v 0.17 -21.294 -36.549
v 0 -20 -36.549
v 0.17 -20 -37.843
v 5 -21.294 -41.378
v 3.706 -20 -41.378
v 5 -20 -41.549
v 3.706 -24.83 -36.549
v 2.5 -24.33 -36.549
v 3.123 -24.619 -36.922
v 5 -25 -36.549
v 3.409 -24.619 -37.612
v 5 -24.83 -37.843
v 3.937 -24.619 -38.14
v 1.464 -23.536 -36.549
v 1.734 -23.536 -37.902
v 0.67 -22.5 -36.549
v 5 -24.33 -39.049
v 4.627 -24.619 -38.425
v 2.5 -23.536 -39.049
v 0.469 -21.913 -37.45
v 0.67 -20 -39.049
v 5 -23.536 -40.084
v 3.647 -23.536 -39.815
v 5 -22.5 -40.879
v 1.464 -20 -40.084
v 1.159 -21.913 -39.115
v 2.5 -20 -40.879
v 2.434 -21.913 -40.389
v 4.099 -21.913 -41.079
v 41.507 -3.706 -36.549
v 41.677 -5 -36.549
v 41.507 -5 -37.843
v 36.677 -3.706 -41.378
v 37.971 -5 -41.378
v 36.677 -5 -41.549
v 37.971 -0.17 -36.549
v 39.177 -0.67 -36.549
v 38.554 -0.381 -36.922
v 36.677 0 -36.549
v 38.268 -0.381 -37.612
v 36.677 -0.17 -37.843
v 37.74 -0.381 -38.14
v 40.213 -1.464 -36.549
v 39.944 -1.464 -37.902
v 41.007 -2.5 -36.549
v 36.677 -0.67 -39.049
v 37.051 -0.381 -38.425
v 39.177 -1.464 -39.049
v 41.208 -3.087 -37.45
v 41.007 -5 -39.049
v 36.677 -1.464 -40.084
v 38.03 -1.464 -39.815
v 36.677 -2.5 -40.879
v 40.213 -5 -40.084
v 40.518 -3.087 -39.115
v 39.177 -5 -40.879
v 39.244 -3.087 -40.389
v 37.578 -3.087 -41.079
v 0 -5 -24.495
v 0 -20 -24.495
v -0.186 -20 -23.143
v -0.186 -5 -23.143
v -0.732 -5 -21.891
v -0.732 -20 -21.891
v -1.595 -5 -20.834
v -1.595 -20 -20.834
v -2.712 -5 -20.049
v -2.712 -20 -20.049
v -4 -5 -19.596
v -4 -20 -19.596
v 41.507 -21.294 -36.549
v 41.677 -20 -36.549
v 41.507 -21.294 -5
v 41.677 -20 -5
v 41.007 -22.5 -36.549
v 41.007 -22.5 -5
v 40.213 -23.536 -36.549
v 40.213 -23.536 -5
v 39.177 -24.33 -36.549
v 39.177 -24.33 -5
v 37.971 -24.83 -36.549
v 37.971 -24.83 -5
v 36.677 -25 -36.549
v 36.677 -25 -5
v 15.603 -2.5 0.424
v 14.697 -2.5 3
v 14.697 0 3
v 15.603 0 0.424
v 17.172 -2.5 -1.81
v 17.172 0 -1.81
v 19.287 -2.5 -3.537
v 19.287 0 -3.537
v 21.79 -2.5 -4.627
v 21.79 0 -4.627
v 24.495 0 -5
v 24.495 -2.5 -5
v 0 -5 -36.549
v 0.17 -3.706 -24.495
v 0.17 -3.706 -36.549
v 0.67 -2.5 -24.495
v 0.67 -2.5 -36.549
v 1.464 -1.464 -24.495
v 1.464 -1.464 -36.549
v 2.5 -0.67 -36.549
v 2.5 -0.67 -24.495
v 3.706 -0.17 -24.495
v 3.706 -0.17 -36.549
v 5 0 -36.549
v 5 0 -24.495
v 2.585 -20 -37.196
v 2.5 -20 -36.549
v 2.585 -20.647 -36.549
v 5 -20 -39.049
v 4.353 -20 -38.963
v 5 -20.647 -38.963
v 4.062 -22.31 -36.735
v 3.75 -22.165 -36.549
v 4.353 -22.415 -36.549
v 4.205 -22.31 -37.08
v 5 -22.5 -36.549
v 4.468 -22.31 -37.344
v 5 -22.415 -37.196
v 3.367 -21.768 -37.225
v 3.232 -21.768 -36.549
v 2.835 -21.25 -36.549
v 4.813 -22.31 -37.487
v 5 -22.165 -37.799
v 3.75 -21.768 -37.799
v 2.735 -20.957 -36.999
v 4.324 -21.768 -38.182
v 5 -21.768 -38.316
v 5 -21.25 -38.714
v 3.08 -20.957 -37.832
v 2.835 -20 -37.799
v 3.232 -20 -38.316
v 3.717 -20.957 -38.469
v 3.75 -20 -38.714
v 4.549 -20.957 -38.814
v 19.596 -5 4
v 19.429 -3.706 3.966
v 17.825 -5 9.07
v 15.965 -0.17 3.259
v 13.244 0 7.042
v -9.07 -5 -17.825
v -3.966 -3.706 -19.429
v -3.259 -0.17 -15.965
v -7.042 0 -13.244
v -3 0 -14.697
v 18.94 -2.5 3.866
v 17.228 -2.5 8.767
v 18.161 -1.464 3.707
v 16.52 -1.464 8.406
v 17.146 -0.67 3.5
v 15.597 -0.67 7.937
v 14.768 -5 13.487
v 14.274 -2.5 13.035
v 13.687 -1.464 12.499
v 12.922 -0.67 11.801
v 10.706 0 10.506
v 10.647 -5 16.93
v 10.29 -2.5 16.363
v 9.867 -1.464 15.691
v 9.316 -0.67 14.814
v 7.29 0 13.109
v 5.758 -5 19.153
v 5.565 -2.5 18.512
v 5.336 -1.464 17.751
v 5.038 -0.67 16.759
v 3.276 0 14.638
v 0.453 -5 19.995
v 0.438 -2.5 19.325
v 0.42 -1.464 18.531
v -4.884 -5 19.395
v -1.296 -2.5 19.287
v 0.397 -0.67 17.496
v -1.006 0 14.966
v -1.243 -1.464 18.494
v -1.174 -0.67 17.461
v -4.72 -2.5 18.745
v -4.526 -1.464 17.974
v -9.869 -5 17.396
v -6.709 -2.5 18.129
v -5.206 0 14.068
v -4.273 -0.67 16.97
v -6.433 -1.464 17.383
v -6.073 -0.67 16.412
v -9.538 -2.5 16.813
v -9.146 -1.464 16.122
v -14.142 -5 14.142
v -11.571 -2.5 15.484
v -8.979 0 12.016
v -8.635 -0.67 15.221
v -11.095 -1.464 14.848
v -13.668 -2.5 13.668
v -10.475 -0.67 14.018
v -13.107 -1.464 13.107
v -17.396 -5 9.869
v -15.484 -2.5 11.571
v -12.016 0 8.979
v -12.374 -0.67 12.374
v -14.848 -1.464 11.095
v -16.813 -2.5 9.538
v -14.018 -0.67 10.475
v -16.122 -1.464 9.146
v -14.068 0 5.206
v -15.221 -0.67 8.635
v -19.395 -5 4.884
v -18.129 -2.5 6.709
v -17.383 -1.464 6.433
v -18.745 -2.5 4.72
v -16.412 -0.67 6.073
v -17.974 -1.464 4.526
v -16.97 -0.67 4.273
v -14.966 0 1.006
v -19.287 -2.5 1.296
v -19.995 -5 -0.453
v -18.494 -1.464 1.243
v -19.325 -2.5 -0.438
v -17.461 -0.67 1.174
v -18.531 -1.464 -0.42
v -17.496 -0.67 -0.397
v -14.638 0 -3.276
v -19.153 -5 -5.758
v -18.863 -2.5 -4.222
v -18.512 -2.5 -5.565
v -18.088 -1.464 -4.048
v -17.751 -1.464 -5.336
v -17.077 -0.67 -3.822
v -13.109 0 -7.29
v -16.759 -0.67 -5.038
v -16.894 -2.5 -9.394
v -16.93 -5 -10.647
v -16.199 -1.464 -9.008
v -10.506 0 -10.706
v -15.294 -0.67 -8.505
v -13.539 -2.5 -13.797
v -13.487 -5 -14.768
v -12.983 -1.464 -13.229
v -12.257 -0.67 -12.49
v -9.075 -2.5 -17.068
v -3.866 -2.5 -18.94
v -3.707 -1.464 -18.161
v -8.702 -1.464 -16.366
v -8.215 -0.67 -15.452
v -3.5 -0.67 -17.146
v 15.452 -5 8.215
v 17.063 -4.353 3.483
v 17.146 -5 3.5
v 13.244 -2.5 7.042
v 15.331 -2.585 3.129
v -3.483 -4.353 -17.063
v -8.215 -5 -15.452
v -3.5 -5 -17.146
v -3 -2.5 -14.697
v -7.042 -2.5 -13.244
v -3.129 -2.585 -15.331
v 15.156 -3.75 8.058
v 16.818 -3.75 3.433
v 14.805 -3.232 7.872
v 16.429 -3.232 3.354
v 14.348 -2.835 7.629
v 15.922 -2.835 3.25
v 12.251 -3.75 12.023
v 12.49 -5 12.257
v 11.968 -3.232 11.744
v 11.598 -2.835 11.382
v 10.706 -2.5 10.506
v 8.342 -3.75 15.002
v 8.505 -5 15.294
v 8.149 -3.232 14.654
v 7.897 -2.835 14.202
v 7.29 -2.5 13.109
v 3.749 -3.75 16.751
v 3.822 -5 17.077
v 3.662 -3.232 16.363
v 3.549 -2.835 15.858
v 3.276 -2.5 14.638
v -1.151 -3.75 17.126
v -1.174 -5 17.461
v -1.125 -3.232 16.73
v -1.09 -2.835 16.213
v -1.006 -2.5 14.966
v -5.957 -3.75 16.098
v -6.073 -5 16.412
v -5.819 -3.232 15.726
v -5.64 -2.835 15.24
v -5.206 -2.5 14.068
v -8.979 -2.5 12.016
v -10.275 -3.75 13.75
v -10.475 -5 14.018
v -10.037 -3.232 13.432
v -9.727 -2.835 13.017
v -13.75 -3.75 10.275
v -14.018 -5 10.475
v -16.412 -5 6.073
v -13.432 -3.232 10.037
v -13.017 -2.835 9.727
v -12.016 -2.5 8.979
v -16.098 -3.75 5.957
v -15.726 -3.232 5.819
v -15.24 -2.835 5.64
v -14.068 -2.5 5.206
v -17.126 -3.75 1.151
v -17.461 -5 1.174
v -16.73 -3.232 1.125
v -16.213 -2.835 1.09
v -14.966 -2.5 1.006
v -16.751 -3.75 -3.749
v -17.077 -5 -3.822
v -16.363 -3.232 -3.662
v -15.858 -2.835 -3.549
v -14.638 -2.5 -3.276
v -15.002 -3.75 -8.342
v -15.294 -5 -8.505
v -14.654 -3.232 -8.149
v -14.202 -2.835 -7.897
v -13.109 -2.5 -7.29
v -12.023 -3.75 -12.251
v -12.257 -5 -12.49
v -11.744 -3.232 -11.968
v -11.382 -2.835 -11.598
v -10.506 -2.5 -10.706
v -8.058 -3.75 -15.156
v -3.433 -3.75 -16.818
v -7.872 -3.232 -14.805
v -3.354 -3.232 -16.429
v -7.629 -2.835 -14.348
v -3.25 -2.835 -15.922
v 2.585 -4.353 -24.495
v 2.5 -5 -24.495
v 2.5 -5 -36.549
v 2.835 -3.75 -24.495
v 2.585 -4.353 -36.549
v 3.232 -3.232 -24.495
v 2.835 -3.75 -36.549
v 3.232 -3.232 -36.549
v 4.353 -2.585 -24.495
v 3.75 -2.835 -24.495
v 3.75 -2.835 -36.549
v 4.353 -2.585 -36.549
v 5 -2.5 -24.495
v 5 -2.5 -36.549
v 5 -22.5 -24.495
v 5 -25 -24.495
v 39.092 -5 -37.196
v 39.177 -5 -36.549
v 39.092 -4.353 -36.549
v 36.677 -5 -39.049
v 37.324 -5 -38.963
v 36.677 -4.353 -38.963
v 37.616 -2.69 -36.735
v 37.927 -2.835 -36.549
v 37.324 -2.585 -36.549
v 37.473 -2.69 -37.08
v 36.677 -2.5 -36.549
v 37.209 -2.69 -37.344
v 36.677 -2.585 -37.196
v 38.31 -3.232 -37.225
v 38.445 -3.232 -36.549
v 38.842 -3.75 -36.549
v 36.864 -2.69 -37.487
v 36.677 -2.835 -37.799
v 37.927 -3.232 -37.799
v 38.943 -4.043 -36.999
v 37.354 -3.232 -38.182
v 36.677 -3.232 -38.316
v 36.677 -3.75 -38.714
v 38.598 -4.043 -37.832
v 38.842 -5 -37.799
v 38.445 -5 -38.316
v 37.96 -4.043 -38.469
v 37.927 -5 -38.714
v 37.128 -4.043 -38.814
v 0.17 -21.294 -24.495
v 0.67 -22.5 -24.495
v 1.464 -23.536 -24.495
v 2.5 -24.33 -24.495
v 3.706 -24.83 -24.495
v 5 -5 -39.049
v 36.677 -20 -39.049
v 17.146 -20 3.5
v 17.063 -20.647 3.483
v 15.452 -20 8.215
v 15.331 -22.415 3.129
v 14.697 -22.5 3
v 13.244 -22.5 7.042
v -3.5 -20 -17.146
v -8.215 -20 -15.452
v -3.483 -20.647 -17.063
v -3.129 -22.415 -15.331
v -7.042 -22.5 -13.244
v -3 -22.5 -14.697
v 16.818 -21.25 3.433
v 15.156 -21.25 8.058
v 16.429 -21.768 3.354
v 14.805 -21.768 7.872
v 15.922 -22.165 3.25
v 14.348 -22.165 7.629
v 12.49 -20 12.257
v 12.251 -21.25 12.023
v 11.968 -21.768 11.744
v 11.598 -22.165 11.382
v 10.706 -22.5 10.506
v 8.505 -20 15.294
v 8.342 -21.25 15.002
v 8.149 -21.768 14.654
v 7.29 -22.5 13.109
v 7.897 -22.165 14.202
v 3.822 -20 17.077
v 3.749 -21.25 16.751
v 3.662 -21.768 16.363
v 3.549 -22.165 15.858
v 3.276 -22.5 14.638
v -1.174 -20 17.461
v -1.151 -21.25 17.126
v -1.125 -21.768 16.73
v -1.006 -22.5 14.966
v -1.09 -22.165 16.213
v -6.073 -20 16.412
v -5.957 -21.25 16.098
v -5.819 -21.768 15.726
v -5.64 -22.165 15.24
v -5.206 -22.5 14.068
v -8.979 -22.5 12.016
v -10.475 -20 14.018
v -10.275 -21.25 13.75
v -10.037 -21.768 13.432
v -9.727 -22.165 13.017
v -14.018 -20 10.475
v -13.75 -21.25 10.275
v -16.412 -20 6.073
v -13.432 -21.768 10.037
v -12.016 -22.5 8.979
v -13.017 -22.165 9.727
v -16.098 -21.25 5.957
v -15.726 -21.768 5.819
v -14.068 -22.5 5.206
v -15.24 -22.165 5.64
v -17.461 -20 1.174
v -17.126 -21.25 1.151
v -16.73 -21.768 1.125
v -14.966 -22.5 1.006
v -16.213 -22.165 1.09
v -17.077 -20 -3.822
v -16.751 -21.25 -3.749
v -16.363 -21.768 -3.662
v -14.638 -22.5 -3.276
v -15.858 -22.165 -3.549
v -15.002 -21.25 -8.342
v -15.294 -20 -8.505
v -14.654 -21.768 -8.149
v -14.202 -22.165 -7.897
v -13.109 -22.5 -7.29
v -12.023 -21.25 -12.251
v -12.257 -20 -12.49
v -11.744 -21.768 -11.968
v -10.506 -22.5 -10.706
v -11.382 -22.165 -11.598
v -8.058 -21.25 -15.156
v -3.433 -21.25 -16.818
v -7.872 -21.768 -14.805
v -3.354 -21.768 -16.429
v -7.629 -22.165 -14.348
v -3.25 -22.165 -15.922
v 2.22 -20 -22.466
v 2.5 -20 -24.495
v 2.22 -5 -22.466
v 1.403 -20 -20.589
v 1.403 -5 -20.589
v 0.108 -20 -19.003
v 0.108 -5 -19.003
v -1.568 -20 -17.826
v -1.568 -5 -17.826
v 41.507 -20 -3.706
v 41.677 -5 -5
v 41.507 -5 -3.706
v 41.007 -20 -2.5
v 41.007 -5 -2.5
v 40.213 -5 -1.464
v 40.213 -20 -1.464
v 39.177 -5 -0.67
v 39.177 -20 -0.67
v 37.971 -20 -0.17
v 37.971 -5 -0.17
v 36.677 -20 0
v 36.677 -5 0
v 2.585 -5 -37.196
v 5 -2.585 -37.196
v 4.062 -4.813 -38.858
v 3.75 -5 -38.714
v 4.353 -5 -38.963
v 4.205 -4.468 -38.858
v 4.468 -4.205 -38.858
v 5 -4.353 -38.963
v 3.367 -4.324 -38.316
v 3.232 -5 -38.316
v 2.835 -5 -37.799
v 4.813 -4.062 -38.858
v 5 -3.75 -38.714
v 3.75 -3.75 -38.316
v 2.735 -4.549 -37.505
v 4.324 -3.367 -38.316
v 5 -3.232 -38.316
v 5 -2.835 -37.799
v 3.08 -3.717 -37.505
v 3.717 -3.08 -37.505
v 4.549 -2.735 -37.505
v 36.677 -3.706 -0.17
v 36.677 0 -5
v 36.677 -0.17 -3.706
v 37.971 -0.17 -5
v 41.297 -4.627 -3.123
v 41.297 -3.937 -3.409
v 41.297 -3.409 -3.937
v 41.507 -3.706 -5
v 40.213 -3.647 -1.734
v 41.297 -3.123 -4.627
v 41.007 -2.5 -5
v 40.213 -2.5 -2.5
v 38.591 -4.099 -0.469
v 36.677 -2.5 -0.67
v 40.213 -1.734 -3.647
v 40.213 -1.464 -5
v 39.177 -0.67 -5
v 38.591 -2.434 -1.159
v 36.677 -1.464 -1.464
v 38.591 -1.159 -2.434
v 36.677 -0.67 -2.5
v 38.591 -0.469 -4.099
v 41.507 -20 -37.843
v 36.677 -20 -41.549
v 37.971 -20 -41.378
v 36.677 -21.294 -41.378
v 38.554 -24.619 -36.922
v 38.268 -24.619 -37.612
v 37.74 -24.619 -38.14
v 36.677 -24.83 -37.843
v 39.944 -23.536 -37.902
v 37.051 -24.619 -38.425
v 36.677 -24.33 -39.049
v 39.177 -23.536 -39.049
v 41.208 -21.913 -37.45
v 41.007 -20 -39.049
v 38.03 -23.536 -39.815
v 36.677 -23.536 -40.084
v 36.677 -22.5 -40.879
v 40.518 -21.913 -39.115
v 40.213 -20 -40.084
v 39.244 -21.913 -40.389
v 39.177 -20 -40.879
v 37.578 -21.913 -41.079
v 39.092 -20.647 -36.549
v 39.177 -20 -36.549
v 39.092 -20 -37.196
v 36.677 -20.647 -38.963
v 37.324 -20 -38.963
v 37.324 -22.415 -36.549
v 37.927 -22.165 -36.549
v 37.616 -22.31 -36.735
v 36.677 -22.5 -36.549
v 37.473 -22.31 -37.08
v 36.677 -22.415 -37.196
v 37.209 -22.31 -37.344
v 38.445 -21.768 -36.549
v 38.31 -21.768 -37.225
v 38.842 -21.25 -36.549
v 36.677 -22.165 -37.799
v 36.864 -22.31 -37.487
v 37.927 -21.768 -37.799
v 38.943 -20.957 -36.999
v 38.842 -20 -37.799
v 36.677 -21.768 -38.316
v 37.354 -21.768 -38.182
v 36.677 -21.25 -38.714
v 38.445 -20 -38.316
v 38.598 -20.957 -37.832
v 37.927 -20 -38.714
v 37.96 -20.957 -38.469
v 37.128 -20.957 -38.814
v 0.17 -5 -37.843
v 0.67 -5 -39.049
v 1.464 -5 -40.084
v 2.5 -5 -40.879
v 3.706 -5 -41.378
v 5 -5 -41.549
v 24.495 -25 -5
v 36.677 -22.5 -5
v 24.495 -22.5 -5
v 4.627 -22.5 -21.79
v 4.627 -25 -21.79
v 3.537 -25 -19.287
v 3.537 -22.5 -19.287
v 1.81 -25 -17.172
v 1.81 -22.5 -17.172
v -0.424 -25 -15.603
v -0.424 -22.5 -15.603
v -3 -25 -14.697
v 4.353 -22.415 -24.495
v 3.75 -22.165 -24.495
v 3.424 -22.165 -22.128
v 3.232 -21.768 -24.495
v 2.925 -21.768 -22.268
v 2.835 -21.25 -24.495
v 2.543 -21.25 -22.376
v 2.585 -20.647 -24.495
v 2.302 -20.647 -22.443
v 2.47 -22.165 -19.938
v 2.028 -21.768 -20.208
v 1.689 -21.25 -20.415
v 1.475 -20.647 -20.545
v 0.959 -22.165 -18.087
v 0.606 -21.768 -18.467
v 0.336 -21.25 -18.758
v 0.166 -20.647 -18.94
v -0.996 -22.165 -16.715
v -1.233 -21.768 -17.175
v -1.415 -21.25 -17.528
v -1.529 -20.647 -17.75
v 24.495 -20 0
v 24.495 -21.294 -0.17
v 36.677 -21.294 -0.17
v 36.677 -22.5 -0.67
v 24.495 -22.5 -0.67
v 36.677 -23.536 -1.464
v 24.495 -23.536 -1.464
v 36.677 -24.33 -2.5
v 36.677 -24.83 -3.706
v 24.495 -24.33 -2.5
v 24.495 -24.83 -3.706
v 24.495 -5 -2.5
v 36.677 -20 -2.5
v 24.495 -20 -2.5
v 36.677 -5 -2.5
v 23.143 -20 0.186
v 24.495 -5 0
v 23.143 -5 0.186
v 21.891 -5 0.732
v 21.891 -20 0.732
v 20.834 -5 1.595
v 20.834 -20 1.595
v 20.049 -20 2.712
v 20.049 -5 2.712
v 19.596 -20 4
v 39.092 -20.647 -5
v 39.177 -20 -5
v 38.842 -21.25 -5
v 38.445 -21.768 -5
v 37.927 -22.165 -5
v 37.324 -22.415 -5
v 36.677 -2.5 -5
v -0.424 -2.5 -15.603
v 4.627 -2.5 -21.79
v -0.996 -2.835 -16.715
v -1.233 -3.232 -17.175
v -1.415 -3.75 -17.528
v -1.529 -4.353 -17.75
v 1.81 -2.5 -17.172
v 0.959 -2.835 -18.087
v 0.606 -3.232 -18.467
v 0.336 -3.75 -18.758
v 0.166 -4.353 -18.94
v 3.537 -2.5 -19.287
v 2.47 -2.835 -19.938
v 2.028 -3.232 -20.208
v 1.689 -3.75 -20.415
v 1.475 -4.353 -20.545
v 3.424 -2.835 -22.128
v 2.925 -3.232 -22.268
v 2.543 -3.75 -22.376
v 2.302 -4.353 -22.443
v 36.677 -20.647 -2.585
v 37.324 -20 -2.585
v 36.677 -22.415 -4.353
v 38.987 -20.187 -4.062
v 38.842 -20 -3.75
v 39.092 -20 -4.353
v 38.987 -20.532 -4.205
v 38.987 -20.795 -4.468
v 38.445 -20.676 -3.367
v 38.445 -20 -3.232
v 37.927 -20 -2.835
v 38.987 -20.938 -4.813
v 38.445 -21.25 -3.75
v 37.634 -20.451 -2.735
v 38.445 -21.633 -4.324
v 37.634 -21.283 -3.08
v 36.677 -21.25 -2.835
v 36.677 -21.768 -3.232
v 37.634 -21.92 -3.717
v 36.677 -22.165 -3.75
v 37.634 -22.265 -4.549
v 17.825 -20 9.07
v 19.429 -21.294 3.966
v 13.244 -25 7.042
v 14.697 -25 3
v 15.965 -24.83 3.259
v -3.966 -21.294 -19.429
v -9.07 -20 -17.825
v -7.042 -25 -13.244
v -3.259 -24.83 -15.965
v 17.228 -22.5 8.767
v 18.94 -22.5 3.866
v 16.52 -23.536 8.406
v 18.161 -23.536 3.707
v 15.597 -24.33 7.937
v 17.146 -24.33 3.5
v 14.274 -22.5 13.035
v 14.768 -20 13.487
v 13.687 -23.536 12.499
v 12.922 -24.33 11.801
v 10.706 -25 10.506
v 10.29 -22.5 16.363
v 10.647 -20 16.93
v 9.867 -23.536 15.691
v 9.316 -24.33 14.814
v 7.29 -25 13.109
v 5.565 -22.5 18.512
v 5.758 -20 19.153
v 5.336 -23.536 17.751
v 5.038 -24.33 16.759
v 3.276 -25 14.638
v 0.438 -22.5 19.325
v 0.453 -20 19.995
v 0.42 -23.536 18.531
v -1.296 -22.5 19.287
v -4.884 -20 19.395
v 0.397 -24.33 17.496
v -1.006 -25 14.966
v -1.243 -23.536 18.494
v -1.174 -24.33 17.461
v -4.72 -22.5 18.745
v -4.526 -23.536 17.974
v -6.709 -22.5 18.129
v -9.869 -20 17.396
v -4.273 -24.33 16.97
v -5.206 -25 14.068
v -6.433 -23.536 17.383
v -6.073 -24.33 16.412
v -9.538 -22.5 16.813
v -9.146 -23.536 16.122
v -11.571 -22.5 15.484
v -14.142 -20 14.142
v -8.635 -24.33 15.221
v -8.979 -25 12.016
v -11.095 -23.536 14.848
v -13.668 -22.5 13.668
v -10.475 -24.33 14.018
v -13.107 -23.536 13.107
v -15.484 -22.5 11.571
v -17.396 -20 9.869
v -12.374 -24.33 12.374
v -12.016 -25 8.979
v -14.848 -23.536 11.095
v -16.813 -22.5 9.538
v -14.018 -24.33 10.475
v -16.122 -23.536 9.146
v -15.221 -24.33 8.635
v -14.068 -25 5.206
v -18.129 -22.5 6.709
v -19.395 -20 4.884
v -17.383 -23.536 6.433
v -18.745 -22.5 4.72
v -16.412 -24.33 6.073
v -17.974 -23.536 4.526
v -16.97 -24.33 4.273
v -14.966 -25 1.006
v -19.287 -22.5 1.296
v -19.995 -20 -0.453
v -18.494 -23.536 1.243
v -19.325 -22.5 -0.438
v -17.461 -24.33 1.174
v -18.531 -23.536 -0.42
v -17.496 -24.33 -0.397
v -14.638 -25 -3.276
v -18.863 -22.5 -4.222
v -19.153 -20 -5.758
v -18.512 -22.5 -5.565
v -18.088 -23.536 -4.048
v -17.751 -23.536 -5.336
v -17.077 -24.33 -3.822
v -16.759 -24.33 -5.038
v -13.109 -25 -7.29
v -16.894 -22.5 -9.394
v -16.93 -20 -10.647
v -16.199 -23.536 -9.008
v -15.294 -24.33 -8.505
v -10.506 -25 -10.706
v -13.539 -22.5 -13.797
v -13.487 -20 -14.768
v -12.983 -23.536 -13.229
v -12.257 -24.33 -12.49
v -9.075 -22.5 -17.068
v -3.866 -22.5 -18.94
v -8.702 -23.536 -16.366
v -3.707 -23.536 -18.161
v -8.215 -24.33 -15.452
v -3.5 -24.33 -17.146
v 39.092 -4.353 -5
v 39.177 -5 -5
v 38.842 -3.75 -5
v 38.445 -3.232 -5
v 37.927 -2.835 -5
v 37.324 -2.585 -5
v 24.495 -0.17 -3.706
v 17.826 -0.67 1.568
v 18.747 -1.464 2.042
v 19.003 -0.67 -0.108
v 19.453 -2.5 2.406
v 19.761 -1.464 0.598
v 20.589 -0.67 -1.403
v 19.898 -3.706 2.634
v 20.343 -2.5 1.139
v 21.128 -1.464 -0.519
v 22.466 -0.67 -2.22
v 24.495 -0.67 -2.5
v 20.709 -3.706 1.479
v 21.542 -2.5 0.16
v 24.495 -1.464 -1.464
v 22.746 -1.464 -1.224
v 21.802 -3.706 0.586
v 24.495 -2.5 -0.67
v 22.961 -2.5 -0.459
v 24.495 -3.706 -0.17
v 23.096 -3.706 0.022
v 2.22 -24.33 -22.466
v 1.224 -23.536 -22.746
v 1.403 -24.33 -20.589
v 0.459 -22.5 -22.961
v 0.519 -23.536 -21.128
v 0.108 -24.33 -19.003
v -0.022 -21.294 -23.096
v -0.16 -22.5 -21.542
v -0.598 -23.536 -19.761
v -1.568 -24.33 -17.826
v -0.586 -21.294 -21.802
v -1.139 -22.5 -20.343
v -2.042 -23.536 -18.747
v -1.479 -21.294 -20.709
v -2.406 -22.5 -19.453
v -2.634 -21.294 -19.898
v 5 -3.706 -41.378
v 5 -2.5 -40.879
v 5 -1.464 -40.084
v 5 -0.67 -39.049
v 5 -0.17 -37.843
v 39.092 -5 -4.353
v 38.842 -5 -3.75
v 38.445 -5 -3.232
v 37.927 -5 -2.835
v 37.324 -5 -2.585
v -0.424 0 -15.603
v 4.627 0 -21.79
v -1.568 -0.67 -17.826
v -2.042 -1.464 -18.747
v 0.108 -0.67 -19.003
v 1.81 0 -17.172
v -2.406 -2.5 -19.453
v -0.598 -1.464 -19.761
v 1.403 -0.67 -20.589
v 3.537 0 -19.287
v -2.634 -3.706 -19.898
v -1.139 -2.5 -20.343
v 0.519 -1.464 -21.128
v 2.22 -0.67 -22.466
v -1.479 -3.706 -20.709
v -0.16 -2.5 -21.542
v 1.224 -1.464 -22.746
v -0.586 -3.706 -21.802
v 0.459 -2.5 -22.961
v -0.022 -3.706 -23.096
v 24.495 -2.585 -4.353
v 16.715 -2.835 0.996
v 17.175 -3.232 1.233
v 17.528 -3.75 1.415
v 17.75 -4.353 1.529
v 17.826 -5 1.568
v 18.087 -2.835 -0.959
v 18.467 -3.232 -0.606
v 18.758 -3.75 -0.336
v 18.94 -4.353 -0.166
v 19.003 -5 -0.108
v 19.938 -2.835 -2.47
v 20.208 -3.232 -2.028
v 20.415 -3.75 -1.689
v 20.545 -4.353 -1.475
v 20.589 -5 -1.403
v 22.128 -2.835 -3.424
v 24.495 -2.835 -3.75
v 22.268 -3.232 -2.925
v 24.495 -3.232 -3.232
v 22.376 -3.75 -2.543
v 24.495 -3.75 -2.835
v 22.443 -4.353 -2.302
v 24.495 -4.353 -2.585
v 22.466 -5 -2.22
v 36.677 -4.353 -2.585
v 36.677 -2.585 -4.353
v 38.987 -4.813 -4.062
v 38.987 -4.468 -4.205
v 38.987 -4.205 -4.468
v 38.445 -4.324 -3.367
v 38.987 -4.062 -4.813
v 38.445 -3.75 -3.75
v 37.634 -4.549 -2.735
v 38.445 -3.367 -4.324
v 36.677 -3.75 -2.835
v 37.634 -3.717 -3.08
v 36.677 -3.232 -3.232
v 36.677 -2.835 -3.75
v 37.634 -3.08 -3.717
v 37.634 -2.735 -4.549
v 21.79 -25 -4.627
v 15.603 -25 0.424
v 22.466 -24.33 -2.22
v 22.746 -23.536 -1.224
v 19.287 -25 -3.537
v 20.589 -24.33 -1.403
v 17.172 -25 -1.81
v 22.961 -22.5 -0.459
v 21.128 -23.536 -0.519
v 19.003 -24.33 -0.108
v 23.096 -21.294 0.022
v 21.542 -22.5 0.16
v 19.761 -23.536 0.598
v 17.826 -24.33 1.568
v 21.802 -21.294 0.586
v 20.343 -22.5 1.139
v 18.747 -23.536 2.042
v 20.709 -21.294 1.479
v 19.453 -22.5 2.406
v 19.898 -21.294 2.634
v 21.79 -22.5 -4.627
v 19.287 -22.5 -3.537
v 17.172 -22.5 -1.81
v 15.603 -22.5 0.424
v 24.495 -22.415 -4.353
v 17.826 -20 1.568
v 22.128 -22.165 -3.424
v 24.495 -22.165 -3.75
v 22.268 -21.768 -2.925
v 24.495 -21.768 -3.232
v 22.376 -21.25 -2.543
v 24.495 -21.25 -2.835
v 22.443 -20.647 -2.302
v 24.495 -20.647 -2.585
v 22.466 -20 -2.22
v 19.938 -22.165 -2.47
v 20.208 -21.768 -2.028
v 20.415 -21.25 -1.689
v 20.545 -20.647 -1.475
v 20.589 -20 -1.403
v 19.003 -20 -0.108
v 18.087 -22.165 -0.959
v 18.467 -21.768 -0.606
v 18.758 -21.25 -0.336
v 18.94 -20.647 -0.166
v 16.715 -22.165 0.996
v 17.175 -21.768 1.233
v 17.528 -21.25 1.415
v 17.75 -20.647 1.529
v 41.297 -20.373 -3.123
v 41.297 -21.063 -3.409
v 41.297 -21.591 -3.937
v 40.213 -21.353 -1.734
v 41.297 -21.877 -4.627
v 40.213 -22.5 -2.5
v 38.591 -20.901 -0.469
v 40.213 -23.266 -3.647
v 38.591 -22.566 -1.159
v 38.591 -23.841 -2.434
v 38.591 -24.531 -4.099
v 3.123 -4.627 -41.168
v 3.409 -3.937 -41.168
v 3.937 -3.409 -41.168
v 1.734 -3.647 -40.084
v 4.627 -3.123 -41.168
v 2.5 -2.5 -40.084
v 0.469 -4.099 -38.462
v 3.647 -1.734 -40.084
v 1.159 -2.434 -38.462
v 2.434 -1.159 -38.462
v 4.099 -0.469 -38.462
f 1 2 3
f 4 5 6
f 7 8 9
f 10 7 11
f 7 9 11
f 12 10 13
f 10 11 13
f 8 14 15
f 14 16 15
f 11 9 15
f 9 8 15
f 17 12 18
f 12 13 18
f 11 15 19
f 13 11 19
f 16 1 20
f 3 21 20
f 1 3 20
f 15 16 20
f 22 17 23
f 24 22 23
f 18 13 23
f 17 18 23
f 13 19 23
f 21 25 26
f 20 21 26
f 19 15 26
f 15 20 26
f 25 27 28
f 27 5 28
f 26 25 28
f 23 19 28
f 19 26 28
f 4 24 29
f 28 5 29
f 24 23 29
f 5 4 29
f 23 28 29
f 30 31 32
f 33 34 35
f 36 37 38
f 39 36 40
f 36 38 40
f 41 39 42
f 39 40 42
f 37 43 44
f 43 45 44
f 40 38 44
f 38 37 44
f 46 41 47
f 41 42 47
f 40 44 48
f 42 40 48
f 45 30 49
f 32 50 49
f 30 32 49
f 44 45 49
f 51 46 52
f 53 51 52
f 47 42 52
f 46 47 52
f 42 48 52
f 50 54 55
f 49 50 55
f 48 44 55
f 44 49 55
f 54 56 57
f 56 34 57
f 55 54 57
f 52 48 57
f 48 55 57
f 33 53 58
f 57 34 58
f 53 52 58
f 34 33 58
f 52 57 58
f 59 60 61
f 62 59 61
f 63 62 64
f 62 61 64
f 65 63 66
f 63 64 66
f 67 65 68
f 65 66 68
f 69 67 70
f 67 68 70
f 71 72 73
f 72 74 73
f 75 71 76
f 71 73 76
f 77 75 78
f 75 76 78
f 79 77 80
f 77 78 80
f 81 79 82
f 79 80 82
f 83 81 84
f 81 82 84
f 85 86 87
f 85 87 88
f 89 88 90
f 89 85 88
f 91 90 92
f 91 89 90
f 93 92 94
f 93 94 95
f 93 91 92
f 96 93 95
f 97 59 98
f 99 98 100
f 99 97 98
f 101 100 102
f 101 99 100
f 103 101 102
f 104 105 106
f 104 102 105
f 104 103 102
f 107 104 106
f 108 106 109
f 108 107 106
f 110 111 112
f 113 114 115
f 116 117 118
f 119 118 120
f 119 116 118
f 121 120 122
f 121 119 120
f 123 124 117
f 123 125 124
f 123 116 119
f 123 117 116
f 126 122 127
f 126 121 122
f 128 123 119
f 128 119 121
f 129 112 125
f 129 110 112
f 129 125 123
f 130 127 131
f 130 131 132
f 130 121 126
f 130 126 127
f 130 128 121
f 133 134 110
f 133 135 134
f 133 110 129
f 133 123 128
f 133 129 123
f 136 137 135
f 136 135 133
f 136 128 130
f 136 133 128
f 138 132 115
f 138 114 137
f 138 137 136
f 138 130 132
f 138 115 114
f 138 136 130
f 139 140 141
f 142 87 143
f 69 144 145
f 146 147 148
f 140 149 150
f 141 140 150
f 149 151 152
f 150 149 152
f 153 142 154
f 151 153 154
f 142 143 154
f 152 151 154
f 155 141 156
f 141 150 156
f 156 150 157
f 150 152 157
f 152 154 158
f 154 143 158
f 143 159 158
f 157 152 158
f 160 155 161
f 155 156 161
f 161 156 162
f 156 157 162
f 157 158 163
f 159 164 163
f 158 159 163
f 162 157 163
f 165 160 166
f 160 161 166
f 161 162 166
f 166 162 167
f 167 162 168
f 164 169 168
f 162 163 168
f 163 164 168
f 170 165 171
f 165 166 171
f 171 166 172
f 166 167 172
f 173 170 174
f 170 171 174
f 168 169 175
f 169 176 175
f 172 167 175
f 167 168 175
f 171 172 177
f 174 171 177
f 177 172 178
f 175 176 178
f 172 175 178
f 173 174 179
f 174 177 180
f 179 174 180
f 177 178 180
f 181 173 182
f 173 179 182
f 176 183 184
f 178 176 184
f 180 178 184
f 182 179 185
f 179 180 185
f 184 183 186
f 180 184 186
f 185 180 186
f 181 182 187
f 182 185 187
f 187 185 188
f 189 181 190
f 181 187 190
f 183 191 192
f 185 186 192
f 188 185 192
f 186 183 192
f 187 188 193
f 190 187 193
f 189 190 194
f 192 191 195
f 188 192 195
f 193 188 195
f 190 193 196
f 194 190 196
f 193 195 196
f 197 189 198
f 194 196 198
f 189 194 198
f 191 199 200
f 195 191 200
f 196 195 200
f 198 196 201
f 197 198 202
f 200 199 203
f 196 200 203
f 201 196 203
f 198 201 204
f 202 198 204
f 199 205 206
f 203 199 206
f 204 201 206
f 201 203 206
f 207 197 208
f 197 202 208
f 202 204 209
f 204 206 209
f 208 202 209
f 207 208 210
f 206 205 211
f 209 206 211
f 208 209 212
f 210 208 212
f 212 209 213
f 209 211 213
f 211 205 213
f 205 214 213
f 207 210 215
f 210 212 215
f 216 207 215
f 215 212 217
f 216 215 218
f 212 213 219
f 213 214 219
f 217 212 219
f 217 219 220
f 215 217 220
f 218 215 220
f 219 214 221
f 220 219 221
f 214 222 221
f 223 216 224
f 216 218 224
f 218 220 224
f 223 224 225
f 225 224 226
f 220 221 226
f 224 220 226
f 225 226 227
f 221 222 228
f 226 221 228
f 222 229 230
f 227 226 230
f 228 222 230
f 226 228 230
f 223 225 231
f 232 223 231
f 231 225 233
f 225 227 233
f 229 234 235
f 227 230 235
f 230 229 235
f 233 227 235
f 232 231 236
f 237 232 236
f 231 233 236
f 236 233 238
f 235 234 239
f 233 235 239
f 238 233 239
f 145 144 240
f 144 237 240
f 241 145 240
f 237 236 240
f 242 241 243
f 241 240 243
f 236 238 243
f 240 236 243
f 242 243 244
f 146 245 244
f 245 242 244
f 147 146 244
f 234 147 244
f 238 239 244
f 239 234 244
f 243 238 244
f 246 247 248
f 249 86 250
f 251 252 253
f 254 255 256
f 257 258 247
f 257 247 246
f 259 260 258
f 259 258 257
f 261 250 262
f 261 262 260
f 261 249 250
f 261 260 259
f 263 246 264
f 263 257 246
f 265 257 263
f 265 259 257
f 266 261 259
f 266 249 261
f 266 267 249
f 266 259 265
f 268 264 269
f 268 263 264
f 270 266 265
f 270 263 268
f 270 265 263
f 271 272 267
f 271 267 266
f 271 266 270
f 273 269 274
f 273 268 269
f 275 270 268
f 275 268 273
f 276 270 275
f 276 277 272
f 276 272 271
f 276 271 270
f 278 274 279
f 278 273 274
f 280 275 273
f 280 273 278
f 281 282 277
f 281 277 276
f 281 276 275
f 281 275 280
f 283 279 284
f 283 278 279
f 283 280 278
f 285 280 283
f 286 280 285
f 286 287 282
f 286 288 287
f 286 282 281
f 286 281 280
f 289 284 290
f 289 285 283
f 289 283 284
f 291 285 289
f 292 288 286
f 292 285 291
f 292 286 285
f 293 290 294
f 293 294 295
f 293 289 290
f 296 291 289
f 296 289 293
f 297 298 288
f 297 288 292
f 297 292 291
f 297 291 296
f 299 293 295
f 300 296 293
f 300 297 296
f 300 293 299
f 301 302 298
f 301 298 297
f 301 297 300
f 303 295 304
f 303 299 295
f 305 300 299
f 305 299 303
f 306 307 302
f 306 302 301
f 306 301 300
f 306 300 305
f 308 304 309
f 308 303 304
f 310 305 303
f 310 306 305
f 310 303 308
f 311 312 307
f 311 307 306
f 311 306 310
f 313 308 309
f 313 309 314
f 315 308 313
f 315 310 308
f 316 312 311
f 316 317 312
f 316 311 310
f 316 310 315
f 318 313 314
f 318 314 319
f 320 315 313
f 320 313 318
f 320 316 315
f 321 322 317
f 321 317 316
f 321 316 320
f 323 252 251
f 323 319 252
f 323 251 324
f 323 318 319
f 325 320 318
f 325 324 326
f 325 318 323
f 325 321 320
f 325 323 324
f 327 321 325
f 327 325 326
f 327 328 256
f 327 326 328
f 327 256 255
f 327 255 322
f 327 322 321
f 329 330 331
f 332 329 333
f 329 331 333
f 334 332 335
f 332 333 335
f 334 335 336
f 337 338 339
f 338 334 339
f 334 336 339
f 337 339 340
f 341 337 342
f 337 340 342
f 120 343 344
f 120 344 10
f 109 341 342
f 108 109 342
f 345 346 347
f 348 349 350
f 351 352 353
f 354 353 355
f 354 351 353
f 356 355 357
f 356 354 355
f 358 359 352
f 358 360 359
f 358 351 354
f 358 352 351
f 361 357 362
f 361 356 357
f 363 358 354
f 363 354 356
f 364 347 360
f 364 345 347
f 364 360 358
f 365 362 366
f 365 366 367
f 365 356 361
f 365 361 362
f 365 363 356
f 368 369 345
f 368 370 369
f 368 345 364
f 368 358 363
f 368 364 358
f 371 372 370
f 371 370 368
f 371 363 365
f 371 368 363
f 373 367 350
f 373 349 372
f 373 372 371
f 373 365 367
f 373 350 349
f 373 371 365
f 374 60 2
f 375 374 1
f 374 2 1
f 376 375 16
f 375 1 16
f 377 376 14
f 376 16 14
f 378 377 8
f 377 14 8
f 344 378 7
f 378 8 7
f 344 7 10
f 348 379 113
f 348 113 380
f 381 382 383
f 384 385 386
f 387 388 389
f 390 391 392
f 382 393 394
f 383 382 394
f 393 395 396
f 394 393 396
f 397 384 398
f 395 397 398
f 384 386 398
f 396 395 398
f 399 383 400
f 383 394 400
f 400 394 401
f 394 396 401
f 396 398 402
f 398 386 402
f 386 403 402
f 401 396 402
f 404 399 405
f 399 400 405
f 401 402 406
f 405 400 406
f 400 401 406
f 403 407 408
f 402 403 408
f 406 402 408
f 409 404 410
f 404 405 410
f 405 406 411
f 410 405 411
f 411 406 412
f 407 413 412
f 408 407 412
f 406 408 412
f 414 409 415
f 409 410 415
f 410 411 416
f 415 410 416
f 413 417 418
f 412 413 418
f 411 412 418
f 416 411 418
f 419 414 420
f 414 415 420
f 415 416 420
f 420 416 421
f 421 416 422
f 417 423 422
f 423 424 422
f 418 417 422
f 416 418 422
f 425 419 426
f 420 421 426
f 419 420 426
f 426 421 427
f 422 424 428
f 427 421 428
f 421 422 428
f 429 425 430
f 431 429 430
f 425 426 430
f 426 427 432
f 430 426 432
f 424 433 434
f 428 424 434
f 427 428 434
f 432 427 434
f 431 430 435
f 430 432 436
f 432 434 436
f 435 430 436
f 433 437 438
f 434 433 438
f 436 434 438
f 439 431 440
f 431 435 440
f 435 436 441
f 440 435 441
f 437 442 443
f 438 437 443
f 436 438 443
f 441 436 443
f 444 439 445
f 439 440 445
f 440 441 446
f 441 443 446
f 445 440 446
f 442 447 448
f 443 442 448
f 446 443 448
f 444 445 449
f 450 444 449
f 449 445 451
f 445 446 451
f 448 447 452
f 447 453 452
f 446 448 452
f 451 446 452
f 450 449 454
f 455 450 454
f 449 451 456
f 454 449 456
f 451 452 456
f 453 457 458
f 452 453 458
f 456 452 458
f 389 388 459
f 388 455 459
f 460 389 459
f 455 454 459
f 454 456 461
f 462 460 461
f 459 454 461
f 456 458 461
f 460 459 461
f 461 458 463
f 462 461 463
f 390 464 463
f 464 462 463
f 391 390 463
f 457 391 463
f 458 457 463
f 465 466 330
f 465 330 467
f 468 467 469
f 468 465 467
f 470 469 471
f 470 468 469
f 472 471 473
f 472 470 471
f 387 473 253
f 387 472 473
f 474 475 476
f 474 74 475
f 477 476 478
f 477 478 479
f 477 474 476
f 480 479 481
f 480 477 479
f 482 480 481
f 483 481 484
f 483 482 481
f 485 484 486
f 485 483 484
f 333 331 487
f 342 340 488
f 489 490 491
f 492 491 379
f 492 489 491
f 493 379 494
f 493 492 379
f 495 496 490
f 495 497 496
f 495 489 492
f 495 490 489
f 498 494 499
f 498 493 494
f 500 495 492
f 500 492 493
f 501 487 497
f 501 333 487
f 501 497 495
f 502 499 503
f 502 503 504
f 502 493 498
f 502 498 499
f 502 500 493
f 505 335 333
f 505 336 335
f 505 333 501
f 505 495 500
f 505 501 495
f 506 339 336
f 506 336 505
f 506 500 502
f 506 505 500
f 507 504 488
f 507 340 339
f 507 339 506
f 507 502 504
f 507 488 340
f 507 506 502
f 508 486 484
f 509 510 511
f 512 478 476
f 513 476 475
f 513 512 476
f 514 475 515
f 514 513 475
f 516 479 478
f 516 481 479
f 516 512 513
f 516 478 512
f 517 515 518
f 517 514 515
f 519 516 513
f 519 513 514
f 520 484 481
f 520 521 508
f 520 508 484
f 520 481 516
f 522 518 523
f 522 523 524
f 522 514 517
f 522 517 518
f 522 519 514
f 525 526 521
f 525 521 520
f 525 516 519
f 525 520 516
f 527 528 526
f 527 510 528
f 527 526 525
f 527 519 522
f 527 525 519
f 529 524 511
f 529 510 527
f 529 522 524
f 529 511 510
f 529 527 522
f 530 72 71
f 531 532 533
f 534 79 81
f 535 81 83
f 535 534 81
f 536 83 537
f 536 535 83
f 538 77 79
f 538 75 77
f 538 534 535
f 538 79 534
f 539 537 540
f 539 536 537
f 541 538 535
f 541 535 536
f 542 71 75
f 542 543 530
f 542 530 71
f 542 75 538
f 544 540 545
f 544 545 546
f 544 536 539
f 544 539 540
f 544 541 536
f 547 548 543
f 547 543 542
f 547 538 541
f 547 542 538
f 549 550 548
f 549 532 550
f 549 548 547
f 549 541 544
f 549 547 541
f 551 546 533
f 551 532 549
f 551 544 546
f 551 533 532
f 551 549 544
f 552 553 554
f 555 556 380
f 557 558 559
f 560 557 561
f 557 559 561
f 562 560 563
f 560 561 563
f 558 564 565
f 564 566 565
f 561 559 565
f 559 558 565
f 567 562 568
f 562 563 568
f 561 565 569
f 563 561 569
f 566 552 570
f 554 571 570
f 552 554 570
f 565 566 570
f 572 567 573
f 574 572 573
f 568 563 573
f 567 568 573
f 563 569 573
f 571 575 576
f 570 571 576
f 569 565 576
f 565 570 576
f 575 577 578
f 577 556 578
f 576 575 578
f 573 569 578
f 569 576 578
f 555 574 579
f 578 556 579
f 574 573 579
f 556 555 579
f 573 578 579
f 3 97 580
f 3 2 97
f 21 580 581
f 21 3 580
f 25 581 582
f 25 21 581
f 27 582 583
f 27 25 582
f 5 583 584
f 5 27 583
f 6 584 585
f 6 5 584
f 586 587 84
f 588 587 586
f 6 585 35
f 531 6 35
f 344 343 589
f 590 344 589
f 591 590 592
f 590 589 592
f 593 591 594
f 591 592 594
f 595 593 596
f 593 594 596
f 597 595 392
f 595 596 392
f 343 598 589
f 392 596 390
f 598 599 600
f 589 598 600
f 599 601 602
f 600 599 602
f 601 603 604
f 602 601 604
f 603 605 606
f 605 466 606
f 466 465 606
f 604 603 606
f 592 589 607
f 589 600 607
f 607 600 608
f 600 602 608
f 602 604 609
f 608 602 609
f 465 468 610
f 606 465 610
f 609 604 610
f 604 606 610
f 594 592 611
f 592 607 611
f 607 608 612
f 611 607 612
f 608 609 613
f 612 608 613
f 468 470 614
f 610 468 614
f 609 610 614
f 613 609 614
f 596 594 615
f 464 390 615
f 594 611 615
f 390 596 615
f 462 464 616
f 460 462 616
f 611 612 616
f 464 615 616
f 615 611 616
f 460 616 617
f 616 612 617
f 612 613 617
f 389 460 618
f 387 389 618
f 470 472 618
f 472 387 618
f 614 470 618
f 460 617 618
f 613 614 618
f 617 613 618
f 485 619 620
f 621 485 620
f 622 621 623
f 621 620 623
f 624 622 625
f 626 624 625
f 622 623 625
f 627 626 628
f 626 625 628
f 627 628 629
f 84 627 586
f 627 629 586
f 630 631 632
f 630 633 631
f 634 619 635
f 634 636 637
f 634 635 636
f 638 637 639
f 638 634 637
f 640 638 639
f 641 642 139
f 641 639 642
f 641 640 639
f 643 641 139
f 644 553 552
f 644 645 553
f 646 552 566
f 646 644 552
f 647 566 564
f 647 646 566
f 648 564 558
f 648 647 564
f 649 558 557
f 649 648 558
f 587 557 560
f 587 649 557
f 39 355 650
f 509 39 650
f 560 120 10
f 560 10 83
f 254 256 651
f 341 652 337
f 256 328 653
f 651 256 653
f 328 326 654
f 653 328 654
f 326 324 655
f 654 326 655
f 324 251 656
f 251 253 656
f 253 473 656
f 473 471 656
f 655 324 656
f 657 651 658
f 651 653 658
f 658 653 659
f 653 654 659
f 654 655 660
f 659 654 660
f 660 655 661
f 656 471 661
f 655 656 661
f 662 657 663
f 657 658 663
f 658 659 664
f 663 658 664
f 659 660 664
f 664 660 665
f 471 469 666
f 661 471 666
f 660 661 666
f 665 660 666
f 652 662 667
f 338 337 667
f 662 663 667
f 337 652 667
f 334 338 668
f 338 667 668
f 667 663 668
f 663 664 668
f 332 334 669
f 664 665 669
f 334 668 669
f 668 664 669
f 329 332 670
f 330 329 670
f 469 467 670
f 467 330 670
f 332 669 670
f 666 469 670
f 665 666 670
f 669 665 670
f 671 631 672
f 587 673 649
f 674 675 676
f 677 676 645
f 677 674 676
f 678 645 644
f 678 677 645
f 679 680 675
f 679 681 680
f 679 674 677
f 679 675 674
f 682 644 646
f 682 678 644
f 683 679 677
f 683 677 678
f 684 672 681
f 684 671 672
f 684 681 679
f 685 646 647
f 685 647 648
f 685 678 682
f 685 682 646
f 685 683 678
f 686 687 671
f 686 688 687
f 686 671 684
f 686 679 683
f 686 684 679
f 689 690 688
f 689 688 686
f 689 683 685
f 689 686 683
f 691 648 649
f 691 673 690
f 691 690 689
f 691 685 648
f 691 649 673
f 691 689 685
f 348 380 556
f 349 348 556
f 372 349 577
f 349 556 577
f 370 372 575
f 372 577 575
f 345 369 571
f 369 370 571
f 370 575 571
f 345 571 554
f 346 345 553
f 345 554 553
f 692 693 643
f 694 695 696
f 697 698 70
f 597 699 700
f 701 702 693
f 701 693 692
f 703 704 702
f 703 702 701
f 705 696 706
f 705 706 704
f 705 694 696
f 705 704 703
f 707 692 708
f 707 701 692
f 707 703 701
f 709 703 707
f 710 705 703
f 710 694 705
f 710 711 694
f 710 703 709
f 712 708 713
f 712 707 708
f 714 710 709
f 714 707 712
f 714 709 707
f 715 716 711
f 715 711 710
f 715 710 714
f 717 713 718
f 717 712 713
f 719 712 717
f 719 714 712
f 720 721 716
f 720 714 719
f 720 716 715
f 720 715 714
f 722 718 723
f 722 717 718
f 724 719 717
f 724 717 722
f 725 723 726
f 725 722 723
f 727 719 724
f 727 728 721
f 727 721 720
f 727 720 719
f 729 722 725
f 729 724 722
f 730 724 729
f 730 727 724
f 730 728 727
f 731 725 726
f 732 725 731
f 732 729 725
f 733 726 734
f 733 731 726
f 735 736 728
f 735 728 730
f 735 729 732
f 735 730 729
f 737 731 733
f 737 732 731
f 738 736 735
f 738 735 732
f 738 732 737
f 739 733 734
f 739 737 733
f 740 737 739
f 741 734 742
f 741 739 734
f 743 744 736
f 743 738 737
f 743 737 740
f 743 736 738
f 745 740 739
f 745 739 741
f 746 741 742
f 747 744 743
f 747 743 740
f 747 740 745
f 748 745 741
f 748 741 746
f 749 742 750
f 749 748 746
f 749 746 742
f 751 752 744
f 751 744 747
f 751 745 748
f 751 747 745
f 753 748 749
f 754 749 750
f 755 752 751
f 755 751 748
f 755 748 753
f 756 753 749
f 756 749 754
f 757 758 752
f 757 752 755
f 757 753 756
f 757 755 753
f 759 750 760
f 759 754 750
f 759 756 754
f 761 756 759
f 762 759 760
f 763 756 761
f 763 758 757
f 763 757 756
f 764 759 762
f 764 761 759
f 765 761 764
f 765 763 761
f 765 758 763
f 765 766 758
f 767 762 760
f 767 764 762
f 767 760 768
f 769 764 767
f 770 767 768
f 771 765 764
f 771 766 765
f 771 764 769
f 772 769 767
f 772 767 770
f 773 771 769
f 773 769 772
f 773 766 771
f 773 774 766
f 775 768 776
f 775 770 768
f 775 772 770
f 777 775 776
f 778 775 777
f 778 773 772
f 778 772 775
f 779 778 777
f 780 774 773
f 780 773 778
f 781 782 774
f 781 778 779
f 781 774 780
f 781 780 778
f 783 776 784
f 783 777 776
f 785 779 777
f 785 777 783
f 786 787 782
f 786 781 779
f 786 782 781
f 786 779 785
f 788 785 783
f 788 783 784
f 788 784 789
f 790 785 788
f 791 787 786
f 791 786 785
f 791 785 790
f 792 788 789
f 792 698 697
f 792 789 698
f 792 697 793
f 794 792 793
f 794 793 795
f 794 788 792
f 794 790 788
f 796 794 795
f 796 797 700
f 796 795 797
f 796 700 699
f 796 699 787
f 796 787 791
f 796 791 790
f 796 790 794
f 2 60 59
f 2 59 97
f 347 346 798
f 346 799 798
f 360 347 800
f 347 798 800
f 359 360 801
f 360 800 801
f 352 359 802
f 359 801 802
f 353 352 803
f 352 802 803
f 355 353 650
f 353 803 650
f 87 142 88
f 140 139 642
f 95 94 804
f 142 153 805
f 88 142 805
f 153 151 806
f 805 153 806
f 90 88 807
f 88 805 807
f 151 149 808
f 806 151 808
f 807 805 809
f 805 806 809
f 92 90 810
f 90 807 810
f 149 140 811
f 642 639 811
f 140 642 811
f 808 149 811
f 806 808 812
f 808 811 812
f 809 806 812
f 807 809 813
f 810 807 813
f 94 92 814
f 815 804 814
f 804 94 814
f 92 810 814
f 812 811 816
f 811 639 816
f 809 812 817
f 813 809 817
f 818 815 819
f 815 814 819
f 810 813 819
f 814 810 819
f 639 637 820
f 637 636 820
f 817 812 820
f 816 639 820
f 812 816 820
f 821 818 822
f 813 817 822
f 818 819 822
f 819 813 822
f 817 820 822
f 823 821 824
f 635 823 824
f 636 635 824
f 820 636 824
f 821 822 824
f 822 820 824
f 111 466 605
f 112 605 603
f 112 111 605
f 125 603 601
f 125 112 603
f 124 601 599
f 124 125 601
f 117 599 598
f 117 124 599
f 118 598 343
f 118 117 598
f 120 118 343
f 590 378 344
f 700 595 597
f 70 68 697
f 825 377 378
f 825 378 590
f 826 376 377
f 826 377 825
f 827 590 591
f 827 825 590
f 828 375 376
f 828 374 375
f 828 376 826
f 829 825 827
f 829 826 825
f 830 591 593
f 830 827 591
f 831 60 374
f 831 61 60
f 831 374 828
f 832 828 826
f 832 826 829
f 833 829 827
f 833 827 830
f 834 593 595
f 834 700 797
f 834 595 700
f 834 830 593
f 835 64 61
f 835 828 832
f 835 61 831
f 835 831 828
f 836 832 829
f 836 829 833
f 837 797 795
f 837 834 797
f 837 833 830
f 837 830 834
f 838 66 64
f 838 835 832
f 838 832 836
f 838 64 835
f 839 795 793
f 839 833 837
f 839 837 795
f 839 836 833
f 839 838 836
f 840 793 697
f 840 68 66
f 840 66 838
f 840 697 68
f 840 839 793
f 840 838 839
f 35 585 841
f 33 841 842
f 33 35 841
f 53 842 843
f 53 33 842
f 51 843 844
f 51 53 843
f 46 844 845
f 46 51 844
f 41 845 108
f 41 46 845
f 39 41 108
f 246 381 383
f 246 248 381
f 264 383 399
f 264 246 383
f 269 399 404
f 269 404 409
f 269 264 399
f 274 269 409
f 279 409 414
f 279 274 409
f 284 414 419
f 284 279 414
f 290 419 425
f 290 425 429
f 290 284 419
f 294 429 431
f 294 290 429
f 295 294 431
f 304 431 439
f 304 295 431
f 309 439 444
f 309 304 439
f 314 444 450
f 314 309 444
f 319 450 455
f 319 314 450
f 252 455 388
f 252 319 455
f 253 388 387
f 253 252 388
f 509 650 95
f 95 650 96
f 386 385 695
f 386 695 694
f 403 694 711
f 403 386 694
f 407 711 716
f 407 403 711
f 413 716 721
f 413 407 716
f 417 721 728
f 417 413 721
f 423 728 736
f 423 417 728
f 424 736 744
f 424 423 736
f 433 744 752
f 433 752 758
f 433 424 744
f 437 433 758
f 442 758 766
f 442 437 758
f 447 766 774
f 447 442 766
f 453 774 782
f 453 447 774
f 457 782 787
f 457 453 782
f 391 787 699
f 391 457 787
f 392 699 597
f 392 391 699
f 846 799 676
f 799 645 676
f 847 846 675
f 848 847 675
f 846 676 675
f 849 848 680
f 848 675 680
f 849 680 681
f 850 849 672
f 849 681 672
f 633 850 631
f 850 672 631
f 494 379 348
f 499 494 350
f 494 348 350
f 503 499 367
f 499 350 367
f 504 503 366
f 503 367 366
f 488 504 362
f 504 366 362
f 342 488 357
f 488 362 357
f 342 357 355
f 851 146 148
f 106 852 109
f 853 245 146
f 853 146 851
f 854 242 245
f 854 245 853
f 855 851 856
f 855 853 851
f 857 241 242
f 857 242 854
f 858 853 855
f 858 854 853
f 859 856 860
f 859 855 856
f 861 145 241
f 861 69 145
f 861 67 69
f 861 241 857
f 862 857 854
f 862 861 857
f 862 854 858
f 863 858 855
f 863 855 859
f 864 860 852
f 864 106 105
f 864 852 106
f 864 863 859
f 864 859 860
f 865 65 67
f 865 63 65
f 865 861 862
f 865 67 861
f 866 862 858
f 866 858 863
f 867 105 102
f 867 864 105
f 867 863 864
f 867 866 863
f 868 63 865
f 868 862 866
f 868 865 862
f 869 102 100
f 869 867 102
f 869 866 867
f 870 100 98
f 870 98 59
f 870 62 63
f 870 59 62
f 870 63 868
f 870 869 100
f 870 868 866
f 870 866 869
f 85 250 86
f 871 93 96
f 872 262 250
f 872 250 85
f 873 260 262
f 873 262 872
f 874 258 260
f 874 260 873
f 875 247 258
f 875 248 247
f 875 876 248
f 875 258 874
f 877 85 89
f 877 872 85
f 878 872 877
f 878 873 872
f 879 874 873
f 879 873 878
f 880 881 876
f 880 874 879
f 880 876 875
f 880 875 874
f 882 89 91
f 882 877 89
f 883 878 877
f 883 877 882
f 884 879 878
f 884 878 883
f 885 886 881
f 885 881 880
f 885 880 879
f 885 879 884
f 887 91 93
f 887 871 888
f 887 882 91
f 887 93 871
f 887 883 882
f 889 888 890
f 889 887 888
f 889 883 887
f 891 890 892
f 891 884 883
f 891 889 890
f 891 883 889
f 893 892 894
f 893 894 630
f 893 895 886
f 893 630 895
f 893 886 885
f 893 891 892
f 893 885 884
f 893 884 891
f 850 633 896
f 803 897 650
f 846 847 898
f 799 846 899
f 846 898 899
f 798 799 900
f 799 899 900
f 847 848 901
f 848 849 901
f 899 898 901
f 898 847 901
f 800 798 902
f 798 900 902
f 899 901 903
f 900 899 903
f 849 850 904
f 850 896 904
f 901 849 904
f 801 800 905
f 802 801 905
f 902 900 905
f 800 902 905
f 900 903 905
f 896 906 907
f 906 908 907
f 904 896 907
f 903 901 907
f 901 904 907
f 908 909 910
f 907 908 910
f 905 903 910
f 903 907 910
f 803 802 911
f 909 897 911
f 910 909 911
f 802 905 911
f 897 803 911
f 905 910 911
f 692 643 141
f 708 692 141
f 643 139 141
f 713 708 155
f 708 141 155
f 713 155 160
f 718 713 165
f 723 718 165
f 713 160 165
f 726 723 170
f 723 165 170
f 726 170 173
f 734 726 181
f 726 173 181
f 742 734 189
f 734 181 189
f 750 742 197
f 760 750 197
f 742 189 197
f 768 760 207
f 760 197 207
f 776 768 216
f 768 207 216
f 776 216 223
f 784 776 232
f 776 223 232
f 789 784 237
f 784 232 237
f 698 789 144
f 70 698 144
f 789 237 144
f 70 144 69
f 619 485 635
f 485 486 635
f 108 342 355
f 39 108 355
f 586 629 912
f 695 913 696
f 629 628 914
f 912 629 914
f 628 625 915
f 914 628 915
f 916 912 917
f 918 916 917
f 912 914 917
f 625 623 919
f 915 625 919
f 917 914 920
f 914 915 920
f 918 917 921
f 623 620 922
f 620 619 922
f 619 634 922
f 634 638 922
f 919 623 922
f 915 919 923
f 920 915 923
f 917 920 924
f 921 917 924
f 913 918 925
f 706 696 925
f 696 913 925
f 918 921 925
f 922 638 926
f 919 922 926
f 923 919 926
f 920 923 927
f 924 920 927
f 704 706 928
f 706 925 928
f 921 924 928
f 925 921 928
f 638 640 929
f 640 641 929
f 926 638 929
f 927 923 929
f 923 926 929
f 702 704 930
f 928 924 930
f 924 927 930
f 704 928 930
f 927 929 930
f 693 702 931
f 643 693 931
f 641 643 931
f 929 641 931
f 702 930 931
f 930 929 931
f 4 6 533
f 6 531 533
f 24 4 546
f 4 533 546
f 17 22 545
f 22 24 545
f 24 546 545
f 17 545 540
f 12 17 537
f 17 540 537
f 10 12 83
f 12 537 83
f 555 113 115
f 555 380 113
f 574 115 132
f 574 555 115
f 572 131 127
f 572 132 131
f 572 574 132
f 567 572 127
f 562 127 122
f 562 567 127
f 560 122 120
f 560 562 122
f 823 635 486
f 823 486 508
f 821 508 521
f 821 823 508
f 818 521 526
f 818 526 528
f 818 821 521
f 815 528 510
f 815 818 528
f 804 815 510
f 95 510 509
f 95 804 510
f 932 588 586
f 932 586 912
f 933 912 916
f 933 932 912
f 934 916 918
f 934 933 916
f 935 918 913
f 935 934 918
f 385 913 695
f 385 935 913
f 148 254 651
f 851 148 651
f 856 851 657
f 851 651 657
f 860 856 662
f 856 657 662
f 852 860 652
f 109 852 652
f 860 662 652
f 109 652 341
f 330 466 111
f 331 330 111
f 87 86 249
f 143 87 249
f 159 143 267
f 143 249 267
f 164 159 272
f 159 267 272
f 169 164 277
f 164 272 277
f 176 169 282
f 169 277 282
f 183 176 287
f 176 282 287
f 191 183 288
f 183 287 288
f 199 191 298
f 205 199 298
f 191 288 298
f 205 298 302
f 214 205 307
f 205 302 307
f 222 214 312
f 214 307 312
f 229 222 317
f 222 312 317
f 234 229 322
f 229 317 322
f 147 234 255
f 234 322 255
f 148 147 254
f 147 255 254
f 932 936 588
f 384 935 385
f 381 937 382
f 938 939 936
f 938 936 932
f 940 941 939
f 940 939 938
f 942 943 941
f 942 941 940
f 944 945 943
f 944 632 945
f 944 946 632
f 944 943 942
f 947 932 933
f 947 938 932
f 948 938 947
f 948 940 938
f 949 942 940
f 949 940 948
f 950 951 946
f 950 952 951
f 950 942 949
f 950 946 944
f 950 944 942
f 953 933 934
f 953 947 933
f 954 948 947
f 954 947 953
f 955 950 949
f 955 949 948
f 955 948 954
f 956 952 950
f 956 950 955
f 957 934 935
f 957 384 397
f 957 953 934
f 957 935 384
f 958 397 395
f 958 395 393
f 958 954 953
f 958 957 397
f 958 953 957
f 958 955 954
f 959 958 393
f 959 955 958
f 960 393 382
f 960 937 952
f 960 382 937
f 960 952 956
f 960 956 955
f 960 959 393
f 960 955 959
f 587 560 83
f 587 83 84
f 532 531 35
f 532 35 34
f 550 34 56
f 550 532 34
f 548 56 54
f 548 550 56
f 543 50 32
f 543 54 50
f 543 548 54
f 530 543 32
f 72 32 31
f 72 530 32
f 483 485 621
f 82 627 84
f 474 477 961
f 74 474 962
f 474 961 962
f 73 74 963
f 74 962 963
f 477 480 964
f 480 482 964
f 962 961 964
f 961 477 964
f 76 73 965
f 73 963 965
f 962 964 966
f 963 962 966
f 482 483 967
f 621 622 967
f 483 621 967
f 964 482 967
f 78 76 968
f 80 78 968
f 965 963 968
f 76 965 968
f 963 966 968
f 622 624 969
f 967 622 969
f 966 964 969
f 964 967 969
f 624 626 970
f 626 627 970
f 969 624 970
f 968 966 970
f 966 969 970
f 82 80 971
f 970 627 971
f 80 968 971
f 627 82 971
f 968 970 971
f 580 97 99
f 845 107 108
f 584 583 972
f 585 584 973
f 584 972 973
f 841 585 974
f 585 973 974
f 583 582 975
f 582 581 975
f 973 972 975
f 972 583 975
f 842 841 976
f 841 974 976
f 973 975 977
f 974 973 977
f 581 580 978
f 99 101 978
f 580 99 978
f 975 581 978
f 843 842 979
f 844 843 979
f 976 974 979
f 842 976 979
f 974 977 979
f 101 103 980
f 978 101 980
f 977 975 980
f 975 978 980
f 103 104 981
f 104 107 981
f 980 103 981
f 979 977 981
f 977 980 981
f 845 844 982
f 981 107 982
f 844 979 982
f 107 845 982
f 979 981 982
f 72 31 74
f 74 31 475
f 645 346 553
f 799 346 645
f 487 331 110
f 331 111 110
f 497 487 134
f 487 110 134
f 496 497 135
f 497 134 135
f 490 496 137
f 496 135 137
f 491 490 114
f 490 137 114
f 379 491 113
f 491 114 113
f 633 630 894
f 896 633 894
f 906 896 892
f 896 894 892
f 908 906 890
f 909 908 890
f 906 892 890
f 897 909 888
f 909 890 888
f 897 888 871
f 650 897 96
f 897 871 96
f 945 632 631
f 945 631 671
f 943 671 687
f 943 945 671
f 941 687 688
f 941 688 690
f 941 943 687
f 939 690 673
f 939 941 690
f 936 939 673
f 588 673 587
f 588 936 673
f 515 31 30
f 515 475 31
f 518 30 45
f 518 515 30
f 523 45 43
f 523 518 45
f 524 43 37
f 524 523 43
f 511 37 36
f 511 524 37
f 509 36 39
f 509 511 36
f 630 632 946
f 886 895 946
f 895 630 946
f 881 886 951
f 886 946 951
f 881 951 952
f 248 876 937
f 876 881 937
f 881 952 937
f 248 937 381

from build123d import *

# Parameters (mm, degrees)
F1_DEPTH = 25
F2_R     = 5
F3_T     = -2.5


# Not quite as in the source:
# - a shell that OpenCascade refuses in one call is made with other operations: the cavity is built on its own and cut out


with BuildPart() as f1:
    # F0 (on Front) → F1 (new body)
    with BuildSketch(Plane.XZ):
        with BuildLine():
            ThreePointArc((0, -20), (14.1421356237, -14.1421356237), (20, 0))
            Line((20, 0), (0, 0))
            Line((0, 0), (0, -20))
        make_face()
        with BuildLine():
            Line((41.6772402823, 0), (20, 0))
            ThreePointArc((20, 0), (14.1421356237, -14.1421356237), (0, -20))
            Line((0, -20), (0, -41.548602283))
            Line((0, -41.548602283), (41.6772402823, -41.548602283))
            Line((41.6772402823, -41.548602283), (41.6772402823, 0))
        make_face()
        with BuildLine():
            Line((0, 0), (20, 0))
            ThreePointArc((20, 0), (-14.1421356237, 14.1421356237), (0, -20))
            Line((0, -20), (0, 0))
        make_face()
    extrude(amount=F1_DEPTH)

    # F2
    f2_edges = [f1.edges().sort_by_distance(p)[0] for p in [
        (30.83862, -25, 0),
        (30.83862, 0, 0),
        (41.67724, -12.5, 0),
        (41.67724, -12.5, -41.548602),
        (41.67724, 0, -20.774301),
        (41.67724, -25, -20.774301),
        (0, 0, -30.774301),
        (0, -12.5, -41.548602),
        (20.83862, 0, -41.548602),
        (0, -25, -30.774301),
        (20.83862, -25, -41.548602),
        (-14.142136, -25, 14.142136),
        (20, -12.5, 0),
        (0, -12.5, -20),
        (-14.142136, 0, 14.142136),
    ]]
    fillet(f2_edges, radius=F2_R)

    # F3: a shell. OpenCascade refuses it in one call, so the cavity is built on its own and cut out:
    # the body offset inwards by the wall thickness, plus a prism from it out through each open face.
    f3_core = offset(f1.part, amount=F3_T, mode=Mode.PRIVATE)
    f3_exits = [f3_core.faces().sort_by_distance(p)[0] for p in [
        (12.277465, -22.5, -12.239423),
        (12.277465, -2.5, -12.239423),
    ]]
    add(f3_core, mode=Mode.SUBTRACT)
    extrude(f3_exits, amount=-F3_T, mode=Mode.SUBTRACT)


solid = f1.part
